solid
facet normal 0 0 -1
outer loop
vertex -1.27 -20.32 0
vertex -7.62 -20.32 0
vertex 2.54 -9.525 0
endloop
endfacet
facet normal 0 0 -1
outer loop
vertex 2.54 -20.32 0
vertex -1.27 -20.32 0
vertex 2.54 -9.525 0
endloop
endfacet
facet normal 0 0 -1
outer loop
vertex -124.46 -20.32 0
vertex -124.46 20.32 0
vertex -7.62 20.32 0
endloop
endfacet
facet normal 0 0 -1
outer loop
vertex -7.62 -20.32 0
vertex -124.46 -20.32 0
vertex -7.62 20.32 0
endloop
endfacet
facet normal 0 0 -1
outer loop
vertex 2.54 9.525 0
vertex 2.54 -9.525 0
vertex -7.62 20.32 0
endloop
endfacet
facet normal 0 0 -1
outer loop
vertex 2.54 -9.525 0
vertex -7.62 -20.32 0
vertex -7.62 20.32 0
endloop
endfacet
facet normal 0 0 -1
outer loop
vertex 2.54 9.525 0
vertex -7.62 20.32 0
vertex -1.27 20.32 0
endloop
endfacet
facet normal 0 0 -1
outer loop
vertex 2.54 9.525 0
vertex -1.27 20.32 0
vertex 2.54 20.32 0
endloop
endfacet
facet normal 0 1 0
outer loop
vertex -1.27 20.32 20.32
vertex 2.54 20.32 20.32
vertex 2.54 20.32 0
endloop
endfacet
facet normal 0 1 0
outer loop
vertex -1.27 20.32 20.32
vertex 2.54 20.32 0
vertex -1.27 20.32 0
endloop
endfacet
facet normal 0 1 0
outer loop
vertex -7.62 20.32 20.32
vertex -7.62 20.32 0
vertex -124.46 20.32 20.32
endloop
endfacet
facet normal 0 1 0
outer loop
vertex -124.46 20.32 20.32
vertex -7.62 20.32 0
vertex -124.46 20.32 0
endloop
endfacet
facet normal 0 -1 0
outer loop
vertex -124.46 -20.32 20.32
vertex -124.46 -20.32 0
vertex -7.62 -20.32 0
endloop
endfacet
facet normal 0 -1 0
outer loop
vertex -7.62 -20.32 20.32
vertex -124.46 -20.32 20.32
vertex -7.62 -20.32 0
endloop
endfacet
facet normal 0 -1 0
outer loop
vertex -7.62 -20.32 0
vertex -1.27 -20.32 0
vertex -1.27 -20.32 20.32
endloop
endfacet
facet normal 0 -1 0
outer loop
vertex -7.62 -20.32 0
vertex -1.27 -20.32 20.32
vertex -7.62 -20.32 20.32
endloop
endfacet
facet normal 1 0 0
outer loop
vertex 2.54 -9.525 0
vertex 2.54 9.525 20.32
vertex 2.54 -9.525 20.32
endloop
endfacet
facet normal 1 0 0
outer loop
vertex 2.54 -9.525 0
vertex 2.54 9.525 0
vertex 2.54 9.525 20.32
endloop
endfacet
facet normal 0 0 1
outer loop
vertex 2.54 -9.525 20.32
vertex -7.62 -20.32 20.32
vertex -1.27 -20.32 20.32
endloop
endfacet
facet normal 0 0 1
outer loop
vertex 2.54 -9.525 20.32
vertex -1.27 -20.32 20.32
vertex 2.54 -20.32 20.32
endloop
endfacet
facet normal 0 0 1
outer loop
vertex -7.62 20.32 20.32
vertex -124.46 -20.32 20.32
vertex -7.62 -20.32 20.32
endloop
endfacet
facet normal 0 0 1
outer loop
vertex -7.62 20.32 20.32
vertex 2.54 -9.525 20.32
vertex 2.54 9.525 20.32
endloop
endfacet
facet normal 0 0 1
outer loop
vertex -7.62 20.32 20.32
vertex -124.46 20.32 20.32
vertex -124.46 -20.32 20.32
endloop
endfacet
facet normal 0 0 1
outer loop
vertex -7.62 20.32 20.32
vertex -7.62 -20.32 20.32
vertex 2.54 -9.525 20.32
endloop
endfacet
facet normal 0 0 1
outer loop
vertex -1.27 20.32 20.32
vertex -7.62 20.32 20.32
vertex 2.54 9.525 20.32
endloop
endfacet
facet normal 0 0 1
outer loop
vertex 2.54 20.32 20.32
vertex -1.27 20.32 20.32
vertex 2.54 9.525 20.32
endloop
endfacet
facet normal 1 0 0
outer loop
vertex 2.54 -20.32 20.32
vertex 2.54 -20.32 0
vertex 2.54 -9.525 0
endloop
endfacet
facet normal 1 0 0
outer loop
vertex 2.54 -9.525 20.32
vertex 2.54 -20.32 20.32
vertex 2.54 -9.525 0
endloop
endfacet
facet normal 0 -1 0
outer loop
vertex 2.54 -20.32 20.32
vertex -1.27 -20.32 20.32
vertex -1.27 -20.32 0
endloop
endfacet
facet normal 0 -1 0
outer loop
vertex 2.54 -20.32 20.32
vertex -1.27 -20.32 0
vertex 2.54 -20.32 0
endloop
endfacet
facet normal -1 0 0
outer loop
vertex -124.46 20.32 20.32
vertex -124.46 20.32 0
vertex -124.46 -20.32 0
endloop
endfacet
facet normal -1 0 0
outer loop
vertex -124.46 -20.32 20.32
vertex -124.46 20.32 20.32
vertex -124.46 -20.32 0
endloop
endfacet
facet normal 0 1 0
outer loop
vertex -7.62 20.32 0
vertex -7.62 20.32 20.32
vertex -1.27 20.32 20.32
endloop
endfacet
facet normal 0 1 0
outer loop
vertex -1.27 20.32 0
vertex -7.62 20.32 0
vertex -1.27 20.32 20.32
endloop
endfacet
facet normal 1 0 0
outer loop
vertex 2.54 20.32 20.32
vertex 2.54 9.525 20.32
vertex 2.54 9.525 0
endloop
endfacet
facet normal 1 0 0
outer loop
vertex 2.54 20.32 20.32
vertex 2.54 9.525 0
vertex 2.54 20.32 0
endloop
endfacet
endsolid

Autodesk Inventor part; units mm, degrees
ref_plane "YZ Plane" through (0, 0, 0) normal (1, 0, 0) x (0, 1, 0)
ref_plane "XZ Plane" through (0, 0, 0) normal (0, 1, 0) x (-1, 0, 0)
ref_plane "XY Plane" through (0, 0, 0) normal (0, 0, 1) x (1, 0, 0)
sketch "Sketch1" plane through (0, 0, 0) normal (0, 0, 1) x (1, 0, 0)
  line L0 (-7.62, 20.32) -> (-1.27, 20.32) projected
  line L1 (2.54, 9.525) -> (2.54, -9.525) projected
  line L2 (-1.27, -20.32) -> (-7.62, -20.32) projected
  line L3 (2.54, 20.32) -> (-124.46, 20.32)
  line L4 (-124.46, 20.32) -> (-124.46, -20.32)
  line L5 (-124.46, -20.32) -> (2.54, -20.32)
  line L6 (2.54, -20.32) -> (2.54, 20.32)
  point P0 (0, 0)
  dimension "d0" = 127
extrude "Extrusion1" add sketch "Sketch1" along normal blind 20.32
properties part number "Battery" material "Acetal Resin, Black"
